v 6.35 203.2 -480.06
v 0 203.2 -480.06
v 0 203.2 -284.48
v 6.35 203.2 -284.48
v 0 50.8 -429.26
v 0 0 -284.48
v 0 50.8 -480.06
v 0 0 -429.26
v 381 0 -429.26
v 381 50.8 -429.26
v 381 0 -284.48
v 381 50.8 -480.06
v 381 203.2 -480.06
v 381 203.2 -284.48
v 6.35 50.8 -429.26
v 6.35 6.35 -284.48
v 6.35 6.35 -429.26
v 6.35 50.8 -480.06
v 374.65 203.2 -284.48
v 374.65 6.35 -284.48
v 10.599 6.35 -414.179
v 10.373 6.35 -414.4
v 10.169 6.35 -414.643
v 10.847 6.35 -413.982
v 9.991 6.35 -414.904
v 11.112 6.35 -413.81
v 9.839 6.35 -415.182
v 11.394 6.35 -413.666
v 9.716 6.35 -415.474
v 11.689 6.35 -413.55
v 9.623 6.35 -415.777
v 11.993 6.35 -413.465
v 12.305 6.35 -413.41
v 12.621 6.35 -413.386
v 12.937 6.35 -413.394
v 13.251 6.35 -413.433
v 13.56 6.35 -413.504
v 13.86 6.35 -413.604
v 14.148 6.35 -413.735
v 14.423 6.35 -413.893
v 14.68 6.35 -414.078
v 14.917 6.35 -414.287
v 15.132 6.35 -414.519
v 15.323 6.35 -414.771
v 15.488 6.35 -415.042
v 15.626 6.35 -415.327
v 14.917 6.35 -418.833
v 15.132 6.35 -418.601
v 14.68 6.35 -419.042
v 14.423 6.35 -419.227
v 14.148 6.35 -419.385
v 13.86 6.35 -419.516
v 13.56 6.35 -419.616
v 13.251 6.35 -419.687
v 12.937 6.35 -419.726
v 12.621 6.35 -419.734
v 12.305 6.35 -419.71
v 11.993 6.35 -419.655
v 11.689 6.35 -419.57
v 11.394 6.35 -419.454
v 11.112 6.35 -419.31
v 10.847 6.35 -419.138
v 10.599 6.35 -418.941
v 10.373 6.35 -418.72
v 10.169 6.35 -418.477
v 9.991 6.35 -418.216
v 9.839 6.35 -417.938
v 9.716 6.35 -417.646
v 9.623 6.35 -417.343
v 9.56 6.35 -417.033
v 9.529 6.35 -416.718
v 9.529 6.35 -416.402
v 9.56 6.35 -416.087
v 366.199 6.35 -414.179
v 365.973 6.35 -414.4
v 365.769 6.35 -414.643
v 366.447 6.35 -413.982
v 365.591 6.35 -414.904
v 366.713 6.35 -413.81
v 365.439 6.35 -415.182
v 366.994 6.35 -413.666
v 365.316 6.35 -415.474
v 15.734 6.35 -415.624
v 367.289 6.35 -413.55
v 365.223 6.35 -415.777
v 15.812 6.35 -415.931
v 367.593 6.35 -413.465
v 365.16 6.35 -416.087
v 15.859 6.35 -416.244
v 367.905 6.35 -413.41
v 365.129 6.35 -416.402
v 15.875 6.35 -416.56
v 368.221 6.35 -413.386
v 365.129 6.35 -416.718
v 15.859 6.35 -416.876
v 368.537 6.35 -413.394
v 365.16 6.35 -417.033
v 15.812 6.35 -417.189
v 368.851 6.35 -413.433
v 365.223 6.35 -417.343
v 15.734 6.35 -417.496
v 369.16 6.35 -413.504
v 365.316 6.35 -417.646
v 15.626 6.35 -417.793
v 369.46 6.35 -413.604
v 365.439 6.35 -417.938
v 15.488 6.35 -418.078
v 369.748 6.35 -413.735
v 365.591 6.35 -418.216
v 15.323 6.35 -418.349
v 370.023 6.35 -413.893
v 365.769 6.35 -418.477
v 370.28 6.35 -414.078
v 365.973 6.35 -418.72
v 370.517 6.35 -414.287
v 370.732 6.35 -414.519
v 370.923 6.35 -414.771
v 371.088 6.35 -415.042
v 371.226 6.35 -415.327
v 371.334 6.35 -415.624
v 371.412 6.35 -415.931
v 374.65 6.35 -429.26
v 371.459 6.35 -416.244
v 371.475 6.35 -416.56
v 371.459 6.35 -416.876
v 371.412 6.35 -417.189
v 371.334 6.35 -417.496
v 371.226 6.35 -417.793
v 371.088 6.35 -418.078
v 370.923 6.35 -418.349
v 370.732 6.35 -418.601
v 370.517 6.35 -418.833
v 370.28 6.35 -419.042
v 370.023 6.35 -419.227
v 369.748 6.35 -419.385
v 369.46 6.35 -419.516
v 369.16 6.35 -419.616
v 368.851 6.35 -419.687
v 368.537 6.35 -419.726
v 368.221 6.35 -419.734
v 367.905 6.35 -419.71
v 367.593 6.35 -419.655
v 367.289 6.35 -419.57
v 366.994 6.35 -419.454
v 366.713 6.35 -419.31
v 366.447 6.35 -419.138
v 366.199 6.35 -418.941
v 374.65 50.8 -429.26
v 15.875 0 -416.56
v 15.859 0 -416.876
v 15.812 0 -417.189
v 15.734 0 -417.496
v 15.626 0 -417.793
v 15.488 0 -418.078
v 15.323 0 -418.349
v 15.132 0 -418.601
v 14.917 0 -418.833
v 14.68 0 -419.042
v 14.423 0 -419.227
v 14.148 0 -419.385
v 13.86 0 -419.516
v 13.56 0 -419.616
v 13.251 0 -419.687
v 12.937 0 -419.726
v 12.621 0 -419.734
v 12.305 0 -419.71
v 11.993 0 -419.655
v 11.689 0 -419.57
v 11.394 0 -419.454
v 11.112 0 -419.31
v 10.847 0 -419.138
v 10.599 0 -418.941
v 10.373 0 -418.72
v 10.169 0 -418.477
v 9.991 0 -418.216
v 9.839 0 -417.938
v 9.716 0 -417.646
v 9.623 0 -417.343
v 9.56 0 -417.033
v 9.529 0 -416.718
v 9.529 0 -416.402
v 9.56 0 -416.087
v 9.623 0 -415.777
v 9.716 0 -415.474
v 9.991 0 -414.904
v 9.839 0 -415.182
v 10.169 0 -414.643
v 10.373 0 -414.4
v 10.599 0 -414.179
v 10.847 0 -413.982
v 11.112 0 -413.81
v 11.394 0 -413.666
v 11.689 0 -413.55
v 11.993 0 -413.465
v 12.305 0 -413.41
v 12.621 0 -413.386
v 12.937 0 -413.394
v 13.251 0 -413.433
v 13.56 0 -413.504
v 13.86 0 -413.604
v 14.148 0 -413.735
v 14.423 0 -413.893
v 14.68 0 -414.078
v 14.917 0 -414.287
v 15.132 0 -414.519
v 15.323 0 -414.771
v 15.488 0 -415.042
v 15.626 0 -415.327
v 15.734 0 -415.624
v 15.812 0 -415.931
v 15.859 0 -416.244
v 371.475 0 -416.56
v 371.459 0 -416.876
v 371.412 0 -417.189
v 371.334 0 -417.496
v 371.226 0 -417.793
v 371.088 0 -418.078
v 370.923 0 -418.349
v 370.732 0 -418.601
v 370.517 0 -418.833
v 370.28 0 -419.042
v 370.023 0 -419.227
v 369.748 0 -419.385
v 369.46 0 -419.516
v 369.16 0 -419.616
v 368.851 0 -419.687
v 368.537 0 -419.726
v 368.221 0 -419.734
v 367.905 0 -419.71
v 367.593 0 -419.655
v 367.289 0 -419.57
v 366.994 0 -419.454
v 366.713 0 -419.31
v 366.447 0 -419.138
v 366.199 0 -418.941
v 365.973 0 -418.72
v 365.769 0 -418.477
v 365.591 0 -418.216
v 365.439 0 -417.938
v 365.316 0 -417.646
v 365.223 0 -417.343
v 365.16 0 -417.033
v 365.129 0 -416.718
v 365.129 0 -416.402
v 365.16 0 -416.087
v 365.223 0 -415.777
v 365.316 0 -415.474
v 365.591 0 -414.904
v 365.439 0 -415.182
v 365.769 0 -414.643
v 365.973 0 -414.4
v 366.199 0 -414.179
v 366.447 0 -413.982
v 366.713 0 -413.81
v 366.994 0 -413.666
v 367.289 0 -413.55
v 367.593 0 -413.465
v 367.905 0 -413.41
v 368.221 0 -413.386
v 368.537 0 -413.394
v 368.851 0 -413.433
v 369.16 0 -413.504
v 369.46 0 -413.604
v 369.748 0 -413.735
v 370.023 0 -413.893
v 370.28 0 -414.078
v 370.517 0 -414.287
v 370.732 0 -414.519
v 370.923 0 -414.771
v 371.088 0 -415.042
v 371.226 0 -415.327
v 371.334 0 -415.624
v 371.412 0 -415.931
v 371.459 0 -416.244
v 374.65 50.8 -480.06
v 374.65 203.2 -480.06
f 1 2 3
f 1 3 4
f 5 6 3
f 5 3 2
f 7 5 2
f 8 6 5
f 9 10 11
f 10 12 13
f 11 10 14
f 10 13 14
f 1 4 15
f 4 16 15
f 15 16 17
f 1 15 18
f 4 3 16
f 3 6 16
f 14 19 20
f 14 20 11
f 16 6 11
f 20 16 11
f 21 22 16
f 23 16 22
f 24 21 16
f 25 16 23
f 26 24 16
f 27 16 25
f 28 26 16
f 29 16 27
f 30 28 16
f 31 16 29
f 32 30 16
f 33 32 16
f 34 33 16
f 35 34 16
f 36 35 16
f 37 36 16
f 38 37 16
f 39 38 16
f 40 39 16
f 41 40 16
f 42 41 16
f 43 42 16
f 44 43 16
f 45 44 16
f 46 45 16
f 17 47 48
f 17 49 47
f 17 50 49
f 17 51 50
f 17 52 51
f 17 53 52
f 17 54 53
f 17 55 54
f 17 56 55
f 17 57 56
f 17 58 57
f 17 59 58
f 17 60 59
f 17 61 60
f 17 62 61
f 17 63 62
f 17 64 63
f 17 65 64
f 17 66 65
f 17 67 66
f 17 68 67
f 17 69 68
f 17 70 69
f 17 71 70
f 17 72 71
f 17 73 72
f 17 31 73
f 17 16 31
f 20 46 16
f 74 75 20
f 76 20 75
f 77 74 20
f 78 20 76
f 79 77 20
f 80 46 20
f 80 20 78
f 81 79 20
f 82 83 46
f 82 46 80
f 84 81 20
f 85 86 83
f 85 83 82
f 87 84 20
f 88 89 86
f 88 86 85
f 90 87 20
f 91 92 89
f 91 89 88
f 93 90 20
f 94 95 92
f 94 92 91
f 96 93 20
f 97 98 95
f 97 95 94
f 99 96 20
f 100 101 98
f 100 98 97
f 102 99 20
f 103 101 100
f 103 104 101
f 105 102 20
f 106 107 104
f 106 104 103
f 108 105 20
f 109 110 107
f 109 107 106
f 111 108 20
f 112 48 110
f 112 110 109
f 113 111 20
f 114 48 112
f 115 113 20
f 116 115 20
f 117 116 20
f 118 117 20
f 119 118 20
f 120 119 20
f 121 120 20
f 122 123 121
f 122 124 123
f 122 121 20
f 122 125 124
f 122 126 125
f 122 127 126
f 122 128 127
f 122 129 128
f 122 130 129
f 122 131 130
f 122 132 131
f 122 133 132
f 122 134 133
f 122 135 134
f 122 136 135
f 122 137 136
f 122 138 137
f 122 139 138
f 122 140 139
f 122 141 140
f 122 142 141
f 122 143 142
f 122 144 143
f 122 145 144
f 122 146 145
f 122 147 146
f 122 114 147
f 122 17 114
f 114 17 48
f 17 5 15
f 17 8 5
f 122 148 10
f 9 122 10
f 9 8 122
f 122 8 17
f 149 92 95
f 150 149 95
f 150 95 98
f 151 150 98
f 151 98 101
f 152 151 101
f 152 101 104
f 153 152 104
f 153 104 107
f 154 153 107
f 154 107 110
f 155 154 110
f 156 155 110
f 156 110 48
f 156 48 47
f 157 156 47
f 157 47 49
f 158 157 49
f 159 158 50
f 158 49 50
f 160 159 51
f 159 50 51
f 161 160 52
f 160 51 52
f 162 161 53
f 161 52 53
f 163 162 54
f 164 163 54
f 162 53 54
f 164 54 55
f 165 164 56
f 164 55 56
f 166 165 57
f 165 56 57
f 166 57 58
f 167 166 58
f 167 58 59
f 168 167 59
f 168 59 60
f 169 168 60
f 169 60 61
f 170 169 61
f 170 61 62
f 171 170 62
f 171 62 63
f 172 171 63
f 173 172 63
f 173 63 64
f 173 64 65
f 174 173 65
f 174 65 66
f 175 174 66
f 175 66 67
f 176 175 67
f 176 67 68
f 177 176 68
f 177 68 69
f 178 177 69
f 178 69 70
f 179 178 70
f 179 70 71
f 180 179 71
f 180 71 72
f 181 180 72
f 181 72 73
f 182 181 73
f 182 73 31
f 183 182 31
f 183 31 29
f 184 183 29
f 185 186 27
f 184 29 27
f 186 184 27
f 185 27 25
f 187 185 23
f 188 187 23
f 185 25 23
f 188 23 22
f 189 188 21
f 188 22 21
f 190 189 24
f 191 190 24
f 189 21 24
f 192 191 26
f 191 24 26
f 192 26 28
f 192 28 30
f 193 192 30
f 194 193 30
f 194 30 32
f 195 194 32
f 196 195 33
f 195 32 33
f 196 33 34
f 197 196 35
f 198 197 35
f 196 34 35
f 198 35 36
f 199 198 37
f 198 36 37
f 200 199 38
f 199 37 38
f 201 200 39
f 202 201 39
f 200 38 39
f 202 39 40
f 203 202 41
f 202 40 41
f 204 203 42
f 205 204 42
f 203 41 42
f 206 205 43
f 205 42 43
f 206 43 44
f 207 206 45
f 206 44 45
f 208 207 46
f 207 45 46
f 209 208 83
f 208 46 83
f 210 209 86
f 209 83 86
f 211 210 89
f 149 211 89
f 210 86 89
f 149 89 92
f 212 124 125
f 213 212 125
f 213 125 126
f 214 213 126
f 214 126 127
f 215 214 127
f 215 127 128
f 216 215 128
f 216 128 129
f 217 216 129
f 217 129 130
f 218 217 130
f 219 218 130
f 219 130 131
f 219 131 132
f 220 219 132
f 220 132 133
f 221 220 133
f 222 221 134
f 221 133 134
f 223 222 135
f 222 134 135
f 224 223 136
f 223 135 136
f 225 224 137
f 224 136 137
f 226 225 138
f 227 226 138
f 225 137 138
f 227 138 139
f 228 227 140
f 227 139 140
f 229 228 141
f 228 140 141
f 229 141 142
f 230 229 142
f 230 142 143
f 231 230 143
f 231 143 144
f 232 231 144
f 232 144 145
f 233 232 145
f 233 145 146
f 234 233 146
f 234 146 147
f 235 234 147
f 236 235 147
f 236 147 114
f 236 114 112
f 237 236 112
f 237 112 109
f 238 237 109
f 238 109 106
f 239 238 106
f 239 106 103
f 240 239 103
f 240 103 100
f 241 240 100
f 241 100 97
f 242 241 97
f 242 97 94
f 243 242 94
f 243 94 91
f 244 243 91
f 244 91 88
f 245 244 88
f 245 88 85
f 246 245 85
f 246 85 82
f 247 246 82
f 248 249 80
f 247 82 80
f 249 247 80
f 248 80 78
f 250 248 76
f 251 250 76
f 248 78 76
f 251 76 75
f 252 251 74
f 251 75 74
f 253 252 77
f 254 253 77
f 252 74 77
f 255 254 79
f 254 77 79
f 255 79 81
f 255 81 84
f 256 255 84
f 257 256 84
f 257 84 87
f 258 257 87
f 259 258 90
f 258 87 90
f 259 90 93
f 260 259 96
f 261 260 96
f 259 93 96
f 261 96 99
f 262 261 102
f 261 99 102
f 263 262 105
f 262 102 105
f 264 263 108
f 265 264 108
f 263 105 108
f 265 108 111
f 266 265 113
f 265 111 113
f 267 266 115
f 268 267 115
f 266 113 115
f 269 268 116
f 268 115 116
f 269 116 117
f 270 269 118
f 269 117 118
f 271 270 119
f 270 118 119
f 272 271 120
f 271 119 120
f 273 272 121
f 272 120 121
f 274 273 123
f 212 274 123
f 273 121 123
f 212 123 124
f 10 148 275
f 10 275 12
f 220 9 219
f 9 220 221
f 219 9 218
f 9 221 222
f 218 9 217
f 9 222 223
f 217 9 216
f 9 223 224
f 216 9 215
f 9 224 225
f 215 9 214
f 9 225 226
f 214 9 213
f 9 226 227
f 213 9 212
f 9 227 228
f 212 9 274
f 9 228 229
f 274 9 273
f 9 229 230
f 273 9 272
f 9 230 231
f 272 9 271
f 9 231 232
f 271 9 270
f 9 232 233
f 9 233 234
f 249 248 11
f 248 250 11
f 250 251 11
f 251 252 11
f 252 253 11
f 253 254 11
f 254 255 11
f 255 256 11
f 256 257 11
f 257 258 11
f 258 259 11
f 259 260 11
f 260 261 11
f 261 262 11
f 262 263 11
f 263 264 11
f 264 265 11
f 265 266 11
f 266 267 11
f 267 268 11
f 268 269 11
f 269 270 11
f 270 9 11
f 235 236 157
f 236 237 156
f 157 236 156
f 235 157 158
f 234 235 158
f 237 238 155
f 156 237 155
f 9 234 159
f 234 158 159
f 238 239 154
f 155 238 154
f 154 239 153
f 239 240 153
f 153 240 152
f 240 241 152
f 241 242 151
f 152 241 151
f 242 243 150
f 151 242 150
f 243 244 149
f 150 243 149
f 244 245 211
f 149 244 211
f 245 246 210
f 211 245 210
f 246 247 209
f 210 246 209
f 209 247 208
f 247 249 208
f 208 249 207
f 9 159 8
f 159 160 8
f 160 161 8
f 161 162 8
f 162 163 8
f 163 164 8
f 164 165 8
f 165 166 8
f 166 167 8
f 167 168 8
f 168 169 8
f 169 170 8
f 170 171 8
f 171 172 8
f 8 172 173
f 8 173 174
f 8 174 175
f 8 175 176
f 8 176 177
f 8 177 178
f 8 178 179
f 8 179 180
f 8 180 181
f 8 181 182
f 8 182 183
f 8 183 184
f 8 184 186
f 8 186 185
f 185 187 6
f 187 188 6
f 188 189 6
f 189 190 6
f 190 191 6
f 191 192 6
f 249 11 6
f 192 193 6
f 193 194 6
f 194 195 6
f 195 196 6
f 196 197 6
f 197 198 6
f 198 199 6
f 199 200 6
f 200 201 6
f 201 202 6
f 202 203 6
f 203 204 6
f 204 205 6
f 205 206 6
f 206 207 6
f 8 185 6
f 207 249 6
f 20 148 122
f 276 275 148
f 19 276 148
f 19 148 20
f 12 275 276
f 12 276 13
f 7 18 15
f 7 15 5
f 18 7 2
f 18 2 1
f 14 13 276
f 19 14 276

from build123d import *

# Parameters (mm, degrees)
SKETCH1_W            = 381
SKETCH1_H            = 429.26
BOSS_EXTRUDE1_DEPTH  = 6.35
SKETCH2_W            = 254
SKETCH2_H            = 203.2
CUT_EXTRUDE1_DEPTH   = 6.35
SKETCH3_W            = 381
SKETCH3_H            = 73.66
CUT_EXTRUDE2_DEPTH   = 6.35
SKETCH4_W            = 254
SKETCH4_H            = 6.35
CUT_EXTRUDE3_DEPTH   = 73.66
SKETCH6_W            = 6.35
SKETCH6_H            = 195.58
BOSS_EXTRUDE2_DEPTH  = 171.45
SKETCH7_W            = 6.35
SKETCH7_H            = 195.58
BOSS_EXTRUDE3_DEPTH  = 158.75
SKETCH8_W            = 6.35
SKETCH8_H            = 165.1
BOSS_EXTRUDE4_DEPTH  = 50.8
SKETCH9_W            = 6.35
SKETCH9_H            = 158.75
CUT_EXTRUDE4_DEPTH   = 50.8
SKETCH10_W           = 6.899940386
SKETCH10_H           = 177.8
BOSS_EXTRUDE5_DEPTH  = 50.8
SKETCH11_W           = 6.35
SKETCH11_H           = 171.45
CUT_EXTRUDE5_DEPTH   = 50.8
SKETCH13_W           = 0.549940386
SKETCH13_H           = 171.45
CUT_EXTRUDE6_DEPTH   = 50.8
SKETCH14_W           = 6.899940386
SKETCH14_H           = 177.8
CUT_EXTRUDE7_DEPTH   = 50.8
SKETCH15_W           = 6.35
SKETCH15_H           = 165.1
CUT_EXTRUDE8_DEPTH   = 50.8
SKETCH16_W           = 6.35
SKETCH16_H           = 144.78
BOSS_EXTRUDE6_DEPTH  = 25.4
SKETCH17_W           = 6.35
SKETCH17_H           = 144.78
BOSS_EXTRUDE7_DEPTH  = 19.05
SKETCH19_W           = 6.35
SKETCH19_H           = 139.7
BOSS_EXTRUDE8_DEPTH  = 50.8
SKETCH20_W           = 6.35
SKETCH20_H           = 195.58
BOSS_EXTRUDE9_DEPTH  = 31.75
SKETCH21_W           = 6.35
SKETCH21_H           = 139.7
BOSS_EXTRUDE10_DEPTH = 50.8
SKETCH22_W           = 6.35
SKETCH22_H           = 195.58
BOSS_EXTRUDE11_DEPTH = 50.8
SKETCH23_W           = 6.35
SKETCH23_H           = 50.8
BOSS_EXTRUDE12_DEPTH = 12.7
SKETCH24_W           = 6.35
SKETCH24_H           = 195.58
BOSS_EXTRUDE13_DEPTH = 12.7
SKETCH26_W           = 381
SKETCH26_H           = 210.82
CUT_EXTRUDE9_DEPTH   = 12.7
SKETCH27_R           = 3.175
CUT_EXTRUDE10_DEPTH  = 635
SKETCH28_R           = 3.175
CUT_EXTRUDE11_DEPTH  = 635


with BuildPart() as part:
    # Sketch1 → Boss-Extrude1 (new body)
    with BuildSketch(Plane(origin=(0, 0, 0), x_dir=(1, 0, 0), z_dir=(0, 1, 0))):
        with Locations((190.5, 214.63)):
            Rectangle(SKETCH1_W, SKETCH1_H)
    extrude(amount=BOSS_EXTRUDE1_DEPTH)

    # Sketch2 → Cut-Extrude1 (cut)
    with BuildSketch(Plane(origin=(0, 6.35, 0), x_dir=(1, 0, 0), z_dir=(0, 1, 0))):
        with Locations((190.5, 101.6)):
            Rectangle(SKETCH2_W, SKETCH2_H)
    extrude(amount=-CUT_EXTRUDE1_DEPTH, mode=Mode.SUBTRACT)

    # Sketch3 → Cut-Extrude2 (cut)
    with BuildSketch(Plane(origin=(0, 6.35, 0), x_dir=(1, 0, 0), z_dir=(0, 1, 0))):
        with Locations((190.5, 36.83)):
            Rectangle(SKETCH3_W, SKETCH3_H)
    extrude(amount=-CUT_EXTRUDE2_DEPTH, mode=Mode.SUBTRACT)

    # Sketch4 → Cut-Extrude3 (cut)
    with BuildSketch(Plane.XY.offset(-203.2)):
        with Locations((190.5, 3.175)):
            Rectangle(SKETCH4_W, SKETCH4_H)
    extrude(amount=-CUT_EXTRUDE3_DEPTH, mode=Mode.SUBTRACT)

    # Sketch6 → Boss-Extrude2 (add)
    with BuildSketch(Plane(origin=(0, 6.35, 0), x_dir=(1, 0, 0), z_dir=(0, 1, 0))):
        with Locations((377.825, 331.47)):
            Rectangle(SKETCH6_W, SKETCH6_H)
    extrude(amount=BOSS_EXTRUDE2_DEPTH)

    # Sketch7 → Boss-Extrude3 (add)
    with BuildSketch(Plane(origin=(0, 6.35, 0), x_dir=(1, 0, 0), z_dir=(0, 1, 0))):
        with Locations((3.175, 331.47)):
            Rectangle(SKETCH7_W, SKETCH7_H)
    extrude(amount=BOSS_EXTRUDE3_DEPTH)

    # Sketch8 → Boss-Extrude4 (add)
    with BuildSketch(Plane(origin=(0, 0, -429.26), x_dir=(-1, 0, 0), z_dir=(0, 0, -1))):
        with Locations((-3.175, 82.55)):
            Rectangle(SKETCH8_W, SKETCH8_H)
    extrude(amount=BOSS_EXTRUDE4_DEPTH)

    # Sketch9 → Cut-Extrude4 (cut)
    with BuildSketch(Plane.XY.offset(-233.68)):
        with Locations((3.175, 85.725)):
            Rectangle(SKETCH9_W, SKETCH9_H)
    extrude(amount=-CUT_EXTRUDE4_DEPTH, mode=Mode.SUBTRACT)

    # Sketch10 → Boss-Extrude5 (add)
    with BuildSketch(Plane(origin=(0, 0, -429.26), x_dir=(-1, 0, 0), z_dir=(0, 0, -1))):
        with Locations((-377.550029807, 88.9)):
            Rectangle(SKETCH10_W, SKETCH10_H)
    extrude(amount=BOSS_EXTRUDE5_DEPTH)

    # Sketch11 → Cut-Extrude5 (cut)
    with BuildSketch(Plane.XY.offset(-233.68)):
        with Locations((377.825, 92.075)):
            Rectangle(SKETCH11_W, SKETCH11_H)
    extrude(amount=-CUT_EXTRUDE5_DEPTH, mode=Mode.SUBTRACT)

    # Sketch13 → Cut-Extrude6 (cut)
    with BuildSketch(Plane.XY.offset(-429.26)):
        with Locations((374.375029807, 92.075)):
            Rectangle(SKETCH13_W, SKETCH13_H)
    extrude(amount=-CUT_EXTRUDE6_DEPTH, mode=Mode.SUBTRACT)

    # Sketch14 → Cut-Extrude7 (cut)
    with BuildSketch(Plane(origin=(0, 0, -480.06), x_dir=(-1, 0, 0), z_dir=(0, 0, -1))):
        with Locations((-377.550029807, 88.9)):
            Rectangle(SKETCH14_W, SKETCH14_H)
    extrude(amount=-CUT_EXTRUDE7_DEPTH, mode=Mode.SUBTRACT)

    # Sketch15 → Cut-Extrude8 (cut)
    with BuildSketch(Plane(origin=(0, 0, -480.06), x_dir=(-1, 0, 0), z_dir=(0, 0, -1))):
        with Locations((-3.175, 82.55)):
            Rectangle(SKETCH15_W, SKETCH15_H)
    extrude(amount=-CUT_EXTRUDE8_DEPTH, mode=Mode.SUBTRACT)

    # Sketch16 → Boss-Extrude6 (add)
    with BuildSketch(Plane(origin=(0, 177.8, 0), x_dir=(1, 0, 0), z_dir=(0, 1, 0))):
        with Locations((377.825, 356.87)):
            Rectangle(SKETCH16_W, SKETCH16_H)
    extrude(amount=BOSS_EXTRUDE6_DEPTH)

    # Sketch17 → Boss-Extrude7 (add)
    with BuildSketch(Plane(origin=(0, 165.1, 0), x_dir=(1, 0, 0), z_dir=(0, 1, 0))):
        with Locations((3.175, 356.87)):
            Rectangle(SKETCH17_W, SKETCH17_H)
    extrude(amount=-BOSS_EXTRUDE7_DEPTH)

    # Sketch19 → Boss-Extrude8 (add)
    with BuildSketch(Plane(origin=(0, 0, -429.26), x_dir=(-1, 0, 0), z_dir=(0, 0, -1))):
        with Locations((-3.175, 120.65)):
            Rectangle(SKETCH19_W, SKETCH19_H)
    extrude(amount=BOSS_EXTRUDE8_DEPTH)

    # Sketch20 → Boss-Extrude9 (add)
    with BuildSketch(Plane(origin=(0, 190.5, 0), x_dir=(1, 0, 0), z_dir=(0, 1, 0))):
        with Locations((3.175, 382.27)):
            Rectangle(SKETCH20_W, SKETCH20_H)
    extrude(amount=-BOSS_EXTRUDE9_DEPTH)

    # Sketch21 → Boss-Extrude10 (add)
    with BuildSketch(Plane(origin=(0, 0, -429.26), x_dir=(-1, 0, 0), z_dir=(0, 0, -1))):
        with Locations((-377.825, 133.35)):
            Rectangle(SKETCH21_W, SKETCH21_H)
    extrude(amount=BOSS_EXTRUDE10_DEPTH)

    # Sketch22 → Boss-Extrude11 (add)
    with BuildSketch(Plane(origin=(0, 203.2, 0), x_dir=(1, 0, 0), z_dir=(0, 1, 0))):
        with Locations((377.825, 382.27)):
            Rectangle(SKETCH22_W, SKETCH22_H)
    extrude(amount=-BOSS_EXTRUDE11_DEPTH)

    # Sketch23 → Boss-Extrude12 (add)
    with BuildSketch(Plane.XZ.offset(-63.5)):
        with Locations((377.825, -454.66)):
            Rectangle(SKETCH23_W, SKETCH23_H)
    extrude(amount=BOSS_EXTRUDE12_DEPTH)

    # Sketch24 → Boss-Extrude13 (add)
    with BuildSketch(Plane(origin=(0, 190.5, 0), x_dir=(1, 0, 0), z_dir=(0, 1, 0))):
        with Locations((3.175, 382.27)):
            Rectangle(SKETCH24_W, SKETCH24_H)
    extrude(amount=BOSS_EXTRUDE13_DEPTH)

    # Sketch26 → Cut-Extrude9 (cut)
    with BuildSketch(Plane(origin=(0, 6.35, 0), x_dir=(1, 0, 0), z_dir=(0, 1, 0))):
        with Locations((190.5, 179.07)):
            Rectangle(SKETCH26_W, SKETCH26_H)
    extrude(amount=-CUT_EXTRUDE9_DEPTH, mode=Mode.SUBTRACT)

    # Sketch27 → Cut-Extrude10 (cut)
    with BuildSketch(Plane(origin=(0, 6.35, 0), x_dir=(1, 0, 0), z_dir=(0, 1, 0))):
        with Locations((368.3, 416.56)):
            Circle(SKETCH27_R)
    extrude(amount=-CUT_EXTRUDE10_DEPTH, mode=Mode.SUBTRACT)

    # Sketch28 → Cut-Extrude11 (cut)
    with BuildSketch(Plane(origin=(0, 6.35, 0), x_dir=(1, 0, 0), z_dir=(0, 1, 0))):
        with Locations((12.7, 416.56)):
            Circle(SKETCH28_R)
    extrude(amount=-CUT_EXTRUDE11_DEPTH, mode=Mode.SUBTRACT)


solid = part.part
